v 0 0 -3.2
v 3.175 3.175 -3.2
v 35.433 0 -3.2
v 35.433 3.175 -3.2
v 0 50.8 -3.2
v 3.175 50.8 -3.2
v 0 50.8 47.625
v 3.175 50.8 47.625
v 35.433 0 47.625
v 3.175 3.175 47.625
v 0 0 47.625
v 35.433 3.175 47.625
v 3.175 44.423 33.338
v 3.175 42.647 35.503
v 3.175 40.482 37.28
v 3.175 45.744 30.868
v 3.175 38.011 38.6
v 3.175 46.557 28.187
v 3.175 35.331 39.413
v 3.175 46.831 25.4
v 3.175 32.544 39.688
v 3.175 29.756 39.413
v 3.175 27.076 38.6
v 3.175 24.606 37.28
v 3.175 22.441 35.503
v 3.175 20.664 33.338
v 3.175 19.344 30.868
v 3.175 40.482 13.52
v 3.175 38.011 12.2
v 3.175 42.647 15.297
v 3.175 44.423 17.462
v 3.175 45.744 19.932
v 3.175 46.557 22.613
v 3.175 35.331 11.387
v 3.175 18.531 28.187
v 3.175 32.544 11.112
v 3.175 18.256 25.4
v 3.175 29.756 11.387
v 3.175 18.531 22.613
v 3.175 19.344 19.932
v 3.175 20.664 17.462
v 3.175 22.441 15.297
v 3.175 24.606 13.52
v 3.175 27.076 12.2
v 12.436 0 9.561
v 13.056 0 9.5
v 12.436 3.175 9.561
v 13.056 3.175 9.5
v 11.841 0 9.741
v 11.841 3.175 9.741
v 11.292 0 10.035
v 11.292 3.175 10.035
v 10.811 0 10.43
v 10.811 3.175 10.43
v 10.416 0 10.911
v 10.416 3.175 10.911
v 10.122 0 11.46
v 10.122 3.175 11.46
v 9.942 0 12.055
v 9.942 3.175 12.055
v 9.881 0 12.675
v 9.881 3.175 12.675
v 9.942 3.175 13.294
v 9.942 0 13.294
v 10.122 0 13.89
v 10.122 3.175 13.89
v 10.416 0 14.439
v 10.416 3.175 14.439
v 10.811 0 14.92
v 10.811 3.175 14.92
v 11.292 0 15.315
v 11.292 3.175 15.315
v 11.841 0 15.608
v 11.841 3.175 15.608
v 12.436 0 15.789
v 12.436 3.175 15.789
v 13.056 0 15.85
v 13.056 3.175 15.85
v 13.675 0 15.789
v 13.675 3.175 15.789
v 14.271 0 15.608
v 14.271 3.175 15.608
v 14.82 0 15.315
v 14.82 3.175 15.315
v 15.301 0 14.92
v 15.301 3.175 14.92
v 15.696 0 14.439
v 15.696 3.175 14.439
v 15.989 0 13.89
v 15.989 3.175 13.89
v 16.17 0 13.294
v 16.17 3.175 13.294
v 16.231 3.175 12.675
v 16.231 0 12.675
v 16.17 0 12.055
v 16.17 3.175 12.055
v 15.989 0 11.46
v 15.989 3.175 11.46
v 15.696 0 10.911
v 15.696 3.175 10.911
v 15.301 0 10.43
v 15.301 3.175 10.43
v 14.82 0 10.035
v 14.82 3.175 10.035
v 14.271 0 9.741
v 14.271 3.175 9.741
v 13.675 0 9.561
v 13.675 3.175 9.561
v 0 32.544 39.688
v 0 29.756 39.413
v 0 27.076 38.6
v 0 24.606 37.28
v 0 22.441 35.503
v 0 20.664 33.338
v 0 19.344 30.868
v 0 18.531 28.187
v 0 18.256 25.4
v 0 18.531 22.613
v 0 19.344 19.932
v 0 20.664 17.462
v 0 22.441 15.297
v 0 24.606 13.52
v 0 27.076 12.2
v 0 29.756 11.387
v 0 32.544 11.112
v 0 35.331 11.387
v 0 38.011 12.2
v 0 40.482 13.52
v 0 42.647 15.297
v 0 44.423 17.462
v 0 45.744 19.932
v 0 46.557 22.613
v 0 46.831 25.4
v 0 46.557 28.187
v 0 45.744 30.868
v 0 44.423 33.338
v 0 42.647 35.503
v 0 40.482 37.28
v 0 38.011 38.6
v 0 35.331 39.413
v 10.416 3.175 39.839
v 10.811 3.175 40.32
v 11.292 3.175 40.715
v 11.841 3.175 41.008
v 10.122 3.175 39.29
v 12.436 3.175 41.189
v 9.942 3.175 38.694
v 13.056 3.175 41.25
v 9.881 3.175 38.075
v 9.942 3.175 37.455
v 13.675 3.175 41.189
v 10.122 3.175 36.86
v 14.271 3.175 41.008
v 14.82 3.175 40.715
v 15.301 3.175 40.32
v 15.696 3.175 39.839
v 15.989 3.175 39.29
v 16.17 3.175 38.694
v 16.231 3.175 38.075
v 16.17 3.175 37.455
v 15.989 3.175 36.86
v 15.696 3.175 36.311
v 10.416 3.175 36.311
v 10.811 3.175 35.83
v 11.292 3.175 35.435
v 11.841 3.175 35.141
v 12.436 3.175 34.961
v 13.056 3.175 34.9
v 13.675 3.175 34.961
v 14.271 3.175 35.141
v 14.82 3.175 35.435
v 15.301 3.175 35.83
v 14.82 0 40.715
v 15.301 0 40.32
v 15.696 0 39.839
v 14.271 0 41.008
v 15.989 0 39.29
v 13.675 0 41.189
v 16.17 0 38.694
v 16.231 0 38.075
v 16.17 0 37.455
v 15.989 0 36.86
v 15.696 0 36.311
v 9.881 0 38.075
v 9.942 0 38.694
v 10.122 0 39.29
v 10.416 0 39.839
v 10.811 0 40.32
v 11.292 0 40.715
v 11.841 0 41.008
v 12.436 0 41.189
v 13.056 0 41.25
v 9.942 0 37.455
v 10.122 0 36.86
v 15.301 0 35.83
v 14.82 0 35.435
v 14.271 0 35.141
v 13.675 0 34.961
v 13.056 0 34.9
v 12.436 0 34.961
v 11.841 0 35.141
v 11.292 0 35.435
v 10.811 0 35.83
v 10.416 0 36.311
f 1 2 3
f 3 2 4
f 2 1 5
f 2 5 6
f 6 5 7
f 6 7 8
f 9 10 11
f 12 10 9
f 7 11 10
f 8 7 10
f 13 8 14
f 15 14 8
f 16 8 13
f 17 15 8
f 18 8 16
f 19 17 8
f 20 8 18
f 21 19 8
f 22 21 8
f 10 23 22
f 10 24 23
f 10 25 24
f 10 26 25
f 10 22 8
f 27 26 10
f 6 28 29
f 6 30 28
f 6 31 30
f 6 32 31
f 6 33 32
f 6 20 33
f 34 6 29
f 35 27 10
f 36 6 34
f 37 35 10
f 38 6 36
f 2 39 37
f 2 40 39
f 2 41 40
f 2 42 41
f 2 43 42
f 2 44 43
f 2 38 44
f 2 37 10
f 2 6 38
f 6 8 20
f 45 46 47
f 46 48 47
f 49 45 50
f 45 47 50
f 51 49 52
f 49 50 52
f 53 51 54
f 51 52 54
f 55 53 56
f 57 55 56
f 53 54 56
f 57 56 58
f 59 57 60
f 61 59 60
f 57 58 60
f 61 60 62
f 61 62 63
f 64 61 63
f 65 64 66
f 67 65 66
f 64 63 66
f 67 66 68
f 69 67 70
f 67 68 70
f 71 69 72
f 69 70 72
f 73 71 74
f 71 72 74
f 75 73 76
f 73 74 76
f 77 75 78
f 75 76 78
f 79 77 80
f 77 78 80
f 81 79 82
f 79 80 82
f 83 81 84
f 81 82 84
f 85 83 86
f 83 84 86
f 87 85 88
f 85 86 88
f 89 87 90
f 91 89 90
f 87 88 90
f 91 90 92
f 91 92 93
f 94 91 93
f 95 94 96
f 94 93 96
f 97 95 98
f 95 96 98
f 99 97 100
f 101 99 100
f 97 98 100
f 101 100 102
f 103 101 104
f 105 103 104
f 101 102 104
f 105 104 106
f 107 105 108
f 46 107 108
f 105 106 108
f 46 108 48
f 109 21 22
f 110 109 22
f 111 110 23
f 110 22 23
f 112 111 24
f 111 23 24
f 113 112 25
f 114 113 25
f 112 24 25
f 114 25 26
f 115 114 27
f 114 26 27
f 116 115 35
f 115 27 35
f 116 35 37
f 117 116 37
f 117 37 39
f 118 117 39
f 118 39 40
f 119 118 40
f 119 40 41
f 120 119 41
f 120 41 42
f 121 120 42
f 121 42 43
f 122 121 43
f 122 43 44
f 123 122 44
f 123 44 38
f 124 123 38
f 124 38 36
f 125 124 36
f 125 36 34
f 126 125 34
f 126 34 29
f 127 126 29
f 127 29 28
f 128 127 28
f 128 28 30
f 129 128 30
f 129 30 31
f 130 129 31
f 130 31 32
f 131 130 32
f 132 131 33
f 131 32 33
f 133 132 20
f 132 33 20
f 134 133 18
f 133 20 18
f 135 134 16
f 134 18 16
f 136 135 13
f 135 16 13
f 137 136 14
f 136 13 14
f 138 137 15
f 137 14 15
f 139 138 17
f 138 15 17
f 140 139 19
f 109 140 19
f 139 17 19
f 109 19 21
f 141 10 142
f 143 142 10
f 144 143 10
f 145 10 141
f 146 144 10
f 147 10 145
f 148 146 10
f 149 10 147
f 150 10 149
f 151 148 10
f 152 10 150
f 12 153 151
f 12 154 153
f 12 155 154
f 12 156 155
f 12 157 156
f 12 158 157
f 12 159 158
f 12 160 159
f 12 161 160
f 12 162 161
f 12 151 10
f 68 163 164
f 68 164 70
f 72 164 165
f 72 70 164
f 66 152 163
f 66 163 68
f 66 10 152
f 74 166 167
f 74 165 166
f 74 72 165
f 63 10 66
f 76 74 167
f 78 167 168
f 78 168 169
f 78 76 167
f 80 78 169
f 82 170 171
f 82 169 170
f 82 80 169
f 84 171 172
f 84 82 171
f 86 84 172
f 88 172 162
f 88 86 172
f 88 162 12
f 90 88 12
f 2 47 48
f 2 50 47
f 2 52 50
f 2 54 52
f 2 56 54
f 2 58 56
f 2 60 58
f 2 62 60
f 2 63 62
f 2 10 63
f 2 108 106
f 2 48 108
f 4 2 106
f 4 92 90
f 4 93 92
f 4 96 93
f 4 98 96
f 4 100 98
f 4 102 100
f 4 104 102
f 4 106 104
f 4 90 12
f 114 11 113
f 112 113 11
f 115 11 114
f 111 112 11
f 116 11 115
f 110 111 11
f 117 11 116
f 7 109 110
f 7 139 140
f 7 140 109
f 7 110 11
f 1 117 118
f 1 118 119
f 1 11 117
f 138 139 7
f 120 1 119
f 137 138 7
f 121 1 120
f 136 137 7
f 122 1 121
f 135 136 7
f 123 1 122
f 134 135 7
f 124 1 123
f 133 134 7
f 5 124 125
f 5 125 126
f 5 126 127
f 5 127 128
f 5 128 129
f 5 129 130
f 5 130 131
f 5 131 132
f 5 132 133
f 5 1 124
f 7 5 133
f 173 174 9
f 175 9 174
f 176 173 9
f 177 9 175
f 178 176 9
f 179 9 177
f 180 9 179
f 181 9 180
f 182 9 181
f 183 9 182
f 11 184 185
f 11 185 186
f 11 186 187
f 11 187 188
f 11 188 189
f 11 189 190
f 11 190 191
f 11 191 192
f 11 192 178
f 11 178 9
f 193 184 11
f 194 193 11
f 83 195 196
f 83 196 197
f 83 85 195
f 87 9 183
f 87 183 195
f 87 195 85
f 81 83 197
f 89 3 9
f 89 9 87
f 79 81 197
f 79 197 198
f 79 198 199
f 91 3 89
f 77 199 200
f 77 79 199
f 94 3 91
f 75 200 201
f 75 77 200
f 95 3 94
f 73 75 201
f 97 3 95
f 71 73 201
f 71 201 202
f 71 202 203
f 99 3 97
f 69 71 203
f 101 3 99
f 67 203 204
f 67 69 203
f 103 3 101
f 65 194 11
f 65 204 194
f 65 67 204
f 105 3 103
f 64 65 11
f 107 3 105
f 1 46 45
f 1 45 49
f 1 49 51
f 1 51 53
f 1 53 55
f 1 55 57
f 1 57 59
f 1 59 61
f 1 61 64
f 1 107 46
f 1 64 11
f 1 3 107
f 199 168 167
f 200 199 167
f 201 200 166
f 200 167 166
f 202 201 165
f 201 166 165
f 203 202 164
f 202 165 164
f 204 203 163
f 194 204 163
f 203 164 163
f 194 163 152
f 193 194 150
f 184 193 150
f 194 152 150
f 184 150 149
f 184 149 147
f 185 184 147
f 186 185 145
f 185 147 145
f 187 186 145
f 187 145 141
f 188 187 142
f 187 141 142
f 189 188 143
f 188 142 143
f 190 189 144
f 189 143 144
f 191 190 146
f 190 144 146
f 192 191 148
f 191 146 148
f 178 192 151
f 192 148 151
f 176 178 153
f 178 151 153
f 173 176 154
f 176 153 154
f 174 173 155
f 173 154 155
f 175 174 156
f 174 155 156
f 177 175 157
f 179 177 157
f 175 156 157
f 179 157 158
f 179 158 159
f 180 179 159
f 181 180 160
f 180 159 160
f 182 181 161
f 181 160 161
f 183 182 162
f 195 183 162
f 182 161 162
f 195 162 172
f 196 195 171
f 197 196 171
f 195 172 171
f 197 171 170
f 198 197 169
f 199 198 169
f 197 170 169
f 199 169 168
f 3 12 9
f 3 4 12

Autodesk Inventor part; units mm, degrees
ref_plane "YZ Plane" through (0, 0, 0) normal (1, 0, 0) x (0, 1, 0)
ref_plane "XZ Plane" through (0, 0, 0) normal (0, 1, 0) x (-1, 0, 0)
ref_plane "XY Plane" through (0, 0, 0) normal (0, 0, 1) x (1, 0, 0)
sketch "Sketch1" plane through (0, 0, 0) normal (0, 0, 1) x (1, 0, 0)
  line L0 (0, 0) -> (0, 50.8)
  line L1 (0, 50.8) -> (3.175, 50.8)
  line L2 (3.175, 50.8) -> (3.175, 3.175)
  line L3 (3.175, 3.175) -> (35.433, 3.175)
  line L4 (35.433, 3.175) -> (35.433, 0)
  line L5 (35.433, 0) -> (0, 0)
  dimension "d0" = 50.8
  dimension "d1" = 35.433
  dimension "d2" = 3.175
  dimension "d3" = 3.175
extrude "Extrusion1" add sketch "Sketch1" along normal blind 47.625 and the other way blind 3.2004
sketch "Sketch2" plane through (0, 0, -3.2004) normal (-1, 0, 0) x (0, 0, 1)
  line L0 (0, 0) -> (0, 50.8) projected
  line L1 (0, 0) -> (50.8254, 0) projected
  line L2 (50.8254, 50.8) -> (50.8254, 0) projected
  line L3 (50.8254, 50.8) -> (0, 50.8) projected
  point P0 (3.2004, 0)
  point P1 (28.6004, 32.5438)
  dimension "d6" = 28.6004
  dimension "d8" = 32.5438
hole "Hole1" at (0, 32.5438, 25.4) direction (1, 0, 0) diameter 28.575 end through all
sketch "Sketch4" plane through (0, 0, 47.625) normal (0, -1, 0) x (1, 0, 0)
  line L0 (35.433, -50.8254) -> (0, -50.8254) projected
  line L1 (35.433, 0) -> (35.433, -50.8254) projected
  point P0 (0, -47.625)
  point P1 (13.0556, -34.9504)
  point P2 (13.0556, -9.5504)
  dimension "d29" = 15.875
  dimension "d30" = 22.3774
  dimension "d31" = 25.4
  dimension "d32" = 22.3774
hole "Hole3" at (13.0556, 0, 12.6746) at (13.0556, 0, 38.0746) direction (0, 1, 0) diameter 6.35 end through all
equation "\"d3\" = d2"
properties part number "CLB_090_ClimberMotorBearingBracket" material "Aluminum 6061"
